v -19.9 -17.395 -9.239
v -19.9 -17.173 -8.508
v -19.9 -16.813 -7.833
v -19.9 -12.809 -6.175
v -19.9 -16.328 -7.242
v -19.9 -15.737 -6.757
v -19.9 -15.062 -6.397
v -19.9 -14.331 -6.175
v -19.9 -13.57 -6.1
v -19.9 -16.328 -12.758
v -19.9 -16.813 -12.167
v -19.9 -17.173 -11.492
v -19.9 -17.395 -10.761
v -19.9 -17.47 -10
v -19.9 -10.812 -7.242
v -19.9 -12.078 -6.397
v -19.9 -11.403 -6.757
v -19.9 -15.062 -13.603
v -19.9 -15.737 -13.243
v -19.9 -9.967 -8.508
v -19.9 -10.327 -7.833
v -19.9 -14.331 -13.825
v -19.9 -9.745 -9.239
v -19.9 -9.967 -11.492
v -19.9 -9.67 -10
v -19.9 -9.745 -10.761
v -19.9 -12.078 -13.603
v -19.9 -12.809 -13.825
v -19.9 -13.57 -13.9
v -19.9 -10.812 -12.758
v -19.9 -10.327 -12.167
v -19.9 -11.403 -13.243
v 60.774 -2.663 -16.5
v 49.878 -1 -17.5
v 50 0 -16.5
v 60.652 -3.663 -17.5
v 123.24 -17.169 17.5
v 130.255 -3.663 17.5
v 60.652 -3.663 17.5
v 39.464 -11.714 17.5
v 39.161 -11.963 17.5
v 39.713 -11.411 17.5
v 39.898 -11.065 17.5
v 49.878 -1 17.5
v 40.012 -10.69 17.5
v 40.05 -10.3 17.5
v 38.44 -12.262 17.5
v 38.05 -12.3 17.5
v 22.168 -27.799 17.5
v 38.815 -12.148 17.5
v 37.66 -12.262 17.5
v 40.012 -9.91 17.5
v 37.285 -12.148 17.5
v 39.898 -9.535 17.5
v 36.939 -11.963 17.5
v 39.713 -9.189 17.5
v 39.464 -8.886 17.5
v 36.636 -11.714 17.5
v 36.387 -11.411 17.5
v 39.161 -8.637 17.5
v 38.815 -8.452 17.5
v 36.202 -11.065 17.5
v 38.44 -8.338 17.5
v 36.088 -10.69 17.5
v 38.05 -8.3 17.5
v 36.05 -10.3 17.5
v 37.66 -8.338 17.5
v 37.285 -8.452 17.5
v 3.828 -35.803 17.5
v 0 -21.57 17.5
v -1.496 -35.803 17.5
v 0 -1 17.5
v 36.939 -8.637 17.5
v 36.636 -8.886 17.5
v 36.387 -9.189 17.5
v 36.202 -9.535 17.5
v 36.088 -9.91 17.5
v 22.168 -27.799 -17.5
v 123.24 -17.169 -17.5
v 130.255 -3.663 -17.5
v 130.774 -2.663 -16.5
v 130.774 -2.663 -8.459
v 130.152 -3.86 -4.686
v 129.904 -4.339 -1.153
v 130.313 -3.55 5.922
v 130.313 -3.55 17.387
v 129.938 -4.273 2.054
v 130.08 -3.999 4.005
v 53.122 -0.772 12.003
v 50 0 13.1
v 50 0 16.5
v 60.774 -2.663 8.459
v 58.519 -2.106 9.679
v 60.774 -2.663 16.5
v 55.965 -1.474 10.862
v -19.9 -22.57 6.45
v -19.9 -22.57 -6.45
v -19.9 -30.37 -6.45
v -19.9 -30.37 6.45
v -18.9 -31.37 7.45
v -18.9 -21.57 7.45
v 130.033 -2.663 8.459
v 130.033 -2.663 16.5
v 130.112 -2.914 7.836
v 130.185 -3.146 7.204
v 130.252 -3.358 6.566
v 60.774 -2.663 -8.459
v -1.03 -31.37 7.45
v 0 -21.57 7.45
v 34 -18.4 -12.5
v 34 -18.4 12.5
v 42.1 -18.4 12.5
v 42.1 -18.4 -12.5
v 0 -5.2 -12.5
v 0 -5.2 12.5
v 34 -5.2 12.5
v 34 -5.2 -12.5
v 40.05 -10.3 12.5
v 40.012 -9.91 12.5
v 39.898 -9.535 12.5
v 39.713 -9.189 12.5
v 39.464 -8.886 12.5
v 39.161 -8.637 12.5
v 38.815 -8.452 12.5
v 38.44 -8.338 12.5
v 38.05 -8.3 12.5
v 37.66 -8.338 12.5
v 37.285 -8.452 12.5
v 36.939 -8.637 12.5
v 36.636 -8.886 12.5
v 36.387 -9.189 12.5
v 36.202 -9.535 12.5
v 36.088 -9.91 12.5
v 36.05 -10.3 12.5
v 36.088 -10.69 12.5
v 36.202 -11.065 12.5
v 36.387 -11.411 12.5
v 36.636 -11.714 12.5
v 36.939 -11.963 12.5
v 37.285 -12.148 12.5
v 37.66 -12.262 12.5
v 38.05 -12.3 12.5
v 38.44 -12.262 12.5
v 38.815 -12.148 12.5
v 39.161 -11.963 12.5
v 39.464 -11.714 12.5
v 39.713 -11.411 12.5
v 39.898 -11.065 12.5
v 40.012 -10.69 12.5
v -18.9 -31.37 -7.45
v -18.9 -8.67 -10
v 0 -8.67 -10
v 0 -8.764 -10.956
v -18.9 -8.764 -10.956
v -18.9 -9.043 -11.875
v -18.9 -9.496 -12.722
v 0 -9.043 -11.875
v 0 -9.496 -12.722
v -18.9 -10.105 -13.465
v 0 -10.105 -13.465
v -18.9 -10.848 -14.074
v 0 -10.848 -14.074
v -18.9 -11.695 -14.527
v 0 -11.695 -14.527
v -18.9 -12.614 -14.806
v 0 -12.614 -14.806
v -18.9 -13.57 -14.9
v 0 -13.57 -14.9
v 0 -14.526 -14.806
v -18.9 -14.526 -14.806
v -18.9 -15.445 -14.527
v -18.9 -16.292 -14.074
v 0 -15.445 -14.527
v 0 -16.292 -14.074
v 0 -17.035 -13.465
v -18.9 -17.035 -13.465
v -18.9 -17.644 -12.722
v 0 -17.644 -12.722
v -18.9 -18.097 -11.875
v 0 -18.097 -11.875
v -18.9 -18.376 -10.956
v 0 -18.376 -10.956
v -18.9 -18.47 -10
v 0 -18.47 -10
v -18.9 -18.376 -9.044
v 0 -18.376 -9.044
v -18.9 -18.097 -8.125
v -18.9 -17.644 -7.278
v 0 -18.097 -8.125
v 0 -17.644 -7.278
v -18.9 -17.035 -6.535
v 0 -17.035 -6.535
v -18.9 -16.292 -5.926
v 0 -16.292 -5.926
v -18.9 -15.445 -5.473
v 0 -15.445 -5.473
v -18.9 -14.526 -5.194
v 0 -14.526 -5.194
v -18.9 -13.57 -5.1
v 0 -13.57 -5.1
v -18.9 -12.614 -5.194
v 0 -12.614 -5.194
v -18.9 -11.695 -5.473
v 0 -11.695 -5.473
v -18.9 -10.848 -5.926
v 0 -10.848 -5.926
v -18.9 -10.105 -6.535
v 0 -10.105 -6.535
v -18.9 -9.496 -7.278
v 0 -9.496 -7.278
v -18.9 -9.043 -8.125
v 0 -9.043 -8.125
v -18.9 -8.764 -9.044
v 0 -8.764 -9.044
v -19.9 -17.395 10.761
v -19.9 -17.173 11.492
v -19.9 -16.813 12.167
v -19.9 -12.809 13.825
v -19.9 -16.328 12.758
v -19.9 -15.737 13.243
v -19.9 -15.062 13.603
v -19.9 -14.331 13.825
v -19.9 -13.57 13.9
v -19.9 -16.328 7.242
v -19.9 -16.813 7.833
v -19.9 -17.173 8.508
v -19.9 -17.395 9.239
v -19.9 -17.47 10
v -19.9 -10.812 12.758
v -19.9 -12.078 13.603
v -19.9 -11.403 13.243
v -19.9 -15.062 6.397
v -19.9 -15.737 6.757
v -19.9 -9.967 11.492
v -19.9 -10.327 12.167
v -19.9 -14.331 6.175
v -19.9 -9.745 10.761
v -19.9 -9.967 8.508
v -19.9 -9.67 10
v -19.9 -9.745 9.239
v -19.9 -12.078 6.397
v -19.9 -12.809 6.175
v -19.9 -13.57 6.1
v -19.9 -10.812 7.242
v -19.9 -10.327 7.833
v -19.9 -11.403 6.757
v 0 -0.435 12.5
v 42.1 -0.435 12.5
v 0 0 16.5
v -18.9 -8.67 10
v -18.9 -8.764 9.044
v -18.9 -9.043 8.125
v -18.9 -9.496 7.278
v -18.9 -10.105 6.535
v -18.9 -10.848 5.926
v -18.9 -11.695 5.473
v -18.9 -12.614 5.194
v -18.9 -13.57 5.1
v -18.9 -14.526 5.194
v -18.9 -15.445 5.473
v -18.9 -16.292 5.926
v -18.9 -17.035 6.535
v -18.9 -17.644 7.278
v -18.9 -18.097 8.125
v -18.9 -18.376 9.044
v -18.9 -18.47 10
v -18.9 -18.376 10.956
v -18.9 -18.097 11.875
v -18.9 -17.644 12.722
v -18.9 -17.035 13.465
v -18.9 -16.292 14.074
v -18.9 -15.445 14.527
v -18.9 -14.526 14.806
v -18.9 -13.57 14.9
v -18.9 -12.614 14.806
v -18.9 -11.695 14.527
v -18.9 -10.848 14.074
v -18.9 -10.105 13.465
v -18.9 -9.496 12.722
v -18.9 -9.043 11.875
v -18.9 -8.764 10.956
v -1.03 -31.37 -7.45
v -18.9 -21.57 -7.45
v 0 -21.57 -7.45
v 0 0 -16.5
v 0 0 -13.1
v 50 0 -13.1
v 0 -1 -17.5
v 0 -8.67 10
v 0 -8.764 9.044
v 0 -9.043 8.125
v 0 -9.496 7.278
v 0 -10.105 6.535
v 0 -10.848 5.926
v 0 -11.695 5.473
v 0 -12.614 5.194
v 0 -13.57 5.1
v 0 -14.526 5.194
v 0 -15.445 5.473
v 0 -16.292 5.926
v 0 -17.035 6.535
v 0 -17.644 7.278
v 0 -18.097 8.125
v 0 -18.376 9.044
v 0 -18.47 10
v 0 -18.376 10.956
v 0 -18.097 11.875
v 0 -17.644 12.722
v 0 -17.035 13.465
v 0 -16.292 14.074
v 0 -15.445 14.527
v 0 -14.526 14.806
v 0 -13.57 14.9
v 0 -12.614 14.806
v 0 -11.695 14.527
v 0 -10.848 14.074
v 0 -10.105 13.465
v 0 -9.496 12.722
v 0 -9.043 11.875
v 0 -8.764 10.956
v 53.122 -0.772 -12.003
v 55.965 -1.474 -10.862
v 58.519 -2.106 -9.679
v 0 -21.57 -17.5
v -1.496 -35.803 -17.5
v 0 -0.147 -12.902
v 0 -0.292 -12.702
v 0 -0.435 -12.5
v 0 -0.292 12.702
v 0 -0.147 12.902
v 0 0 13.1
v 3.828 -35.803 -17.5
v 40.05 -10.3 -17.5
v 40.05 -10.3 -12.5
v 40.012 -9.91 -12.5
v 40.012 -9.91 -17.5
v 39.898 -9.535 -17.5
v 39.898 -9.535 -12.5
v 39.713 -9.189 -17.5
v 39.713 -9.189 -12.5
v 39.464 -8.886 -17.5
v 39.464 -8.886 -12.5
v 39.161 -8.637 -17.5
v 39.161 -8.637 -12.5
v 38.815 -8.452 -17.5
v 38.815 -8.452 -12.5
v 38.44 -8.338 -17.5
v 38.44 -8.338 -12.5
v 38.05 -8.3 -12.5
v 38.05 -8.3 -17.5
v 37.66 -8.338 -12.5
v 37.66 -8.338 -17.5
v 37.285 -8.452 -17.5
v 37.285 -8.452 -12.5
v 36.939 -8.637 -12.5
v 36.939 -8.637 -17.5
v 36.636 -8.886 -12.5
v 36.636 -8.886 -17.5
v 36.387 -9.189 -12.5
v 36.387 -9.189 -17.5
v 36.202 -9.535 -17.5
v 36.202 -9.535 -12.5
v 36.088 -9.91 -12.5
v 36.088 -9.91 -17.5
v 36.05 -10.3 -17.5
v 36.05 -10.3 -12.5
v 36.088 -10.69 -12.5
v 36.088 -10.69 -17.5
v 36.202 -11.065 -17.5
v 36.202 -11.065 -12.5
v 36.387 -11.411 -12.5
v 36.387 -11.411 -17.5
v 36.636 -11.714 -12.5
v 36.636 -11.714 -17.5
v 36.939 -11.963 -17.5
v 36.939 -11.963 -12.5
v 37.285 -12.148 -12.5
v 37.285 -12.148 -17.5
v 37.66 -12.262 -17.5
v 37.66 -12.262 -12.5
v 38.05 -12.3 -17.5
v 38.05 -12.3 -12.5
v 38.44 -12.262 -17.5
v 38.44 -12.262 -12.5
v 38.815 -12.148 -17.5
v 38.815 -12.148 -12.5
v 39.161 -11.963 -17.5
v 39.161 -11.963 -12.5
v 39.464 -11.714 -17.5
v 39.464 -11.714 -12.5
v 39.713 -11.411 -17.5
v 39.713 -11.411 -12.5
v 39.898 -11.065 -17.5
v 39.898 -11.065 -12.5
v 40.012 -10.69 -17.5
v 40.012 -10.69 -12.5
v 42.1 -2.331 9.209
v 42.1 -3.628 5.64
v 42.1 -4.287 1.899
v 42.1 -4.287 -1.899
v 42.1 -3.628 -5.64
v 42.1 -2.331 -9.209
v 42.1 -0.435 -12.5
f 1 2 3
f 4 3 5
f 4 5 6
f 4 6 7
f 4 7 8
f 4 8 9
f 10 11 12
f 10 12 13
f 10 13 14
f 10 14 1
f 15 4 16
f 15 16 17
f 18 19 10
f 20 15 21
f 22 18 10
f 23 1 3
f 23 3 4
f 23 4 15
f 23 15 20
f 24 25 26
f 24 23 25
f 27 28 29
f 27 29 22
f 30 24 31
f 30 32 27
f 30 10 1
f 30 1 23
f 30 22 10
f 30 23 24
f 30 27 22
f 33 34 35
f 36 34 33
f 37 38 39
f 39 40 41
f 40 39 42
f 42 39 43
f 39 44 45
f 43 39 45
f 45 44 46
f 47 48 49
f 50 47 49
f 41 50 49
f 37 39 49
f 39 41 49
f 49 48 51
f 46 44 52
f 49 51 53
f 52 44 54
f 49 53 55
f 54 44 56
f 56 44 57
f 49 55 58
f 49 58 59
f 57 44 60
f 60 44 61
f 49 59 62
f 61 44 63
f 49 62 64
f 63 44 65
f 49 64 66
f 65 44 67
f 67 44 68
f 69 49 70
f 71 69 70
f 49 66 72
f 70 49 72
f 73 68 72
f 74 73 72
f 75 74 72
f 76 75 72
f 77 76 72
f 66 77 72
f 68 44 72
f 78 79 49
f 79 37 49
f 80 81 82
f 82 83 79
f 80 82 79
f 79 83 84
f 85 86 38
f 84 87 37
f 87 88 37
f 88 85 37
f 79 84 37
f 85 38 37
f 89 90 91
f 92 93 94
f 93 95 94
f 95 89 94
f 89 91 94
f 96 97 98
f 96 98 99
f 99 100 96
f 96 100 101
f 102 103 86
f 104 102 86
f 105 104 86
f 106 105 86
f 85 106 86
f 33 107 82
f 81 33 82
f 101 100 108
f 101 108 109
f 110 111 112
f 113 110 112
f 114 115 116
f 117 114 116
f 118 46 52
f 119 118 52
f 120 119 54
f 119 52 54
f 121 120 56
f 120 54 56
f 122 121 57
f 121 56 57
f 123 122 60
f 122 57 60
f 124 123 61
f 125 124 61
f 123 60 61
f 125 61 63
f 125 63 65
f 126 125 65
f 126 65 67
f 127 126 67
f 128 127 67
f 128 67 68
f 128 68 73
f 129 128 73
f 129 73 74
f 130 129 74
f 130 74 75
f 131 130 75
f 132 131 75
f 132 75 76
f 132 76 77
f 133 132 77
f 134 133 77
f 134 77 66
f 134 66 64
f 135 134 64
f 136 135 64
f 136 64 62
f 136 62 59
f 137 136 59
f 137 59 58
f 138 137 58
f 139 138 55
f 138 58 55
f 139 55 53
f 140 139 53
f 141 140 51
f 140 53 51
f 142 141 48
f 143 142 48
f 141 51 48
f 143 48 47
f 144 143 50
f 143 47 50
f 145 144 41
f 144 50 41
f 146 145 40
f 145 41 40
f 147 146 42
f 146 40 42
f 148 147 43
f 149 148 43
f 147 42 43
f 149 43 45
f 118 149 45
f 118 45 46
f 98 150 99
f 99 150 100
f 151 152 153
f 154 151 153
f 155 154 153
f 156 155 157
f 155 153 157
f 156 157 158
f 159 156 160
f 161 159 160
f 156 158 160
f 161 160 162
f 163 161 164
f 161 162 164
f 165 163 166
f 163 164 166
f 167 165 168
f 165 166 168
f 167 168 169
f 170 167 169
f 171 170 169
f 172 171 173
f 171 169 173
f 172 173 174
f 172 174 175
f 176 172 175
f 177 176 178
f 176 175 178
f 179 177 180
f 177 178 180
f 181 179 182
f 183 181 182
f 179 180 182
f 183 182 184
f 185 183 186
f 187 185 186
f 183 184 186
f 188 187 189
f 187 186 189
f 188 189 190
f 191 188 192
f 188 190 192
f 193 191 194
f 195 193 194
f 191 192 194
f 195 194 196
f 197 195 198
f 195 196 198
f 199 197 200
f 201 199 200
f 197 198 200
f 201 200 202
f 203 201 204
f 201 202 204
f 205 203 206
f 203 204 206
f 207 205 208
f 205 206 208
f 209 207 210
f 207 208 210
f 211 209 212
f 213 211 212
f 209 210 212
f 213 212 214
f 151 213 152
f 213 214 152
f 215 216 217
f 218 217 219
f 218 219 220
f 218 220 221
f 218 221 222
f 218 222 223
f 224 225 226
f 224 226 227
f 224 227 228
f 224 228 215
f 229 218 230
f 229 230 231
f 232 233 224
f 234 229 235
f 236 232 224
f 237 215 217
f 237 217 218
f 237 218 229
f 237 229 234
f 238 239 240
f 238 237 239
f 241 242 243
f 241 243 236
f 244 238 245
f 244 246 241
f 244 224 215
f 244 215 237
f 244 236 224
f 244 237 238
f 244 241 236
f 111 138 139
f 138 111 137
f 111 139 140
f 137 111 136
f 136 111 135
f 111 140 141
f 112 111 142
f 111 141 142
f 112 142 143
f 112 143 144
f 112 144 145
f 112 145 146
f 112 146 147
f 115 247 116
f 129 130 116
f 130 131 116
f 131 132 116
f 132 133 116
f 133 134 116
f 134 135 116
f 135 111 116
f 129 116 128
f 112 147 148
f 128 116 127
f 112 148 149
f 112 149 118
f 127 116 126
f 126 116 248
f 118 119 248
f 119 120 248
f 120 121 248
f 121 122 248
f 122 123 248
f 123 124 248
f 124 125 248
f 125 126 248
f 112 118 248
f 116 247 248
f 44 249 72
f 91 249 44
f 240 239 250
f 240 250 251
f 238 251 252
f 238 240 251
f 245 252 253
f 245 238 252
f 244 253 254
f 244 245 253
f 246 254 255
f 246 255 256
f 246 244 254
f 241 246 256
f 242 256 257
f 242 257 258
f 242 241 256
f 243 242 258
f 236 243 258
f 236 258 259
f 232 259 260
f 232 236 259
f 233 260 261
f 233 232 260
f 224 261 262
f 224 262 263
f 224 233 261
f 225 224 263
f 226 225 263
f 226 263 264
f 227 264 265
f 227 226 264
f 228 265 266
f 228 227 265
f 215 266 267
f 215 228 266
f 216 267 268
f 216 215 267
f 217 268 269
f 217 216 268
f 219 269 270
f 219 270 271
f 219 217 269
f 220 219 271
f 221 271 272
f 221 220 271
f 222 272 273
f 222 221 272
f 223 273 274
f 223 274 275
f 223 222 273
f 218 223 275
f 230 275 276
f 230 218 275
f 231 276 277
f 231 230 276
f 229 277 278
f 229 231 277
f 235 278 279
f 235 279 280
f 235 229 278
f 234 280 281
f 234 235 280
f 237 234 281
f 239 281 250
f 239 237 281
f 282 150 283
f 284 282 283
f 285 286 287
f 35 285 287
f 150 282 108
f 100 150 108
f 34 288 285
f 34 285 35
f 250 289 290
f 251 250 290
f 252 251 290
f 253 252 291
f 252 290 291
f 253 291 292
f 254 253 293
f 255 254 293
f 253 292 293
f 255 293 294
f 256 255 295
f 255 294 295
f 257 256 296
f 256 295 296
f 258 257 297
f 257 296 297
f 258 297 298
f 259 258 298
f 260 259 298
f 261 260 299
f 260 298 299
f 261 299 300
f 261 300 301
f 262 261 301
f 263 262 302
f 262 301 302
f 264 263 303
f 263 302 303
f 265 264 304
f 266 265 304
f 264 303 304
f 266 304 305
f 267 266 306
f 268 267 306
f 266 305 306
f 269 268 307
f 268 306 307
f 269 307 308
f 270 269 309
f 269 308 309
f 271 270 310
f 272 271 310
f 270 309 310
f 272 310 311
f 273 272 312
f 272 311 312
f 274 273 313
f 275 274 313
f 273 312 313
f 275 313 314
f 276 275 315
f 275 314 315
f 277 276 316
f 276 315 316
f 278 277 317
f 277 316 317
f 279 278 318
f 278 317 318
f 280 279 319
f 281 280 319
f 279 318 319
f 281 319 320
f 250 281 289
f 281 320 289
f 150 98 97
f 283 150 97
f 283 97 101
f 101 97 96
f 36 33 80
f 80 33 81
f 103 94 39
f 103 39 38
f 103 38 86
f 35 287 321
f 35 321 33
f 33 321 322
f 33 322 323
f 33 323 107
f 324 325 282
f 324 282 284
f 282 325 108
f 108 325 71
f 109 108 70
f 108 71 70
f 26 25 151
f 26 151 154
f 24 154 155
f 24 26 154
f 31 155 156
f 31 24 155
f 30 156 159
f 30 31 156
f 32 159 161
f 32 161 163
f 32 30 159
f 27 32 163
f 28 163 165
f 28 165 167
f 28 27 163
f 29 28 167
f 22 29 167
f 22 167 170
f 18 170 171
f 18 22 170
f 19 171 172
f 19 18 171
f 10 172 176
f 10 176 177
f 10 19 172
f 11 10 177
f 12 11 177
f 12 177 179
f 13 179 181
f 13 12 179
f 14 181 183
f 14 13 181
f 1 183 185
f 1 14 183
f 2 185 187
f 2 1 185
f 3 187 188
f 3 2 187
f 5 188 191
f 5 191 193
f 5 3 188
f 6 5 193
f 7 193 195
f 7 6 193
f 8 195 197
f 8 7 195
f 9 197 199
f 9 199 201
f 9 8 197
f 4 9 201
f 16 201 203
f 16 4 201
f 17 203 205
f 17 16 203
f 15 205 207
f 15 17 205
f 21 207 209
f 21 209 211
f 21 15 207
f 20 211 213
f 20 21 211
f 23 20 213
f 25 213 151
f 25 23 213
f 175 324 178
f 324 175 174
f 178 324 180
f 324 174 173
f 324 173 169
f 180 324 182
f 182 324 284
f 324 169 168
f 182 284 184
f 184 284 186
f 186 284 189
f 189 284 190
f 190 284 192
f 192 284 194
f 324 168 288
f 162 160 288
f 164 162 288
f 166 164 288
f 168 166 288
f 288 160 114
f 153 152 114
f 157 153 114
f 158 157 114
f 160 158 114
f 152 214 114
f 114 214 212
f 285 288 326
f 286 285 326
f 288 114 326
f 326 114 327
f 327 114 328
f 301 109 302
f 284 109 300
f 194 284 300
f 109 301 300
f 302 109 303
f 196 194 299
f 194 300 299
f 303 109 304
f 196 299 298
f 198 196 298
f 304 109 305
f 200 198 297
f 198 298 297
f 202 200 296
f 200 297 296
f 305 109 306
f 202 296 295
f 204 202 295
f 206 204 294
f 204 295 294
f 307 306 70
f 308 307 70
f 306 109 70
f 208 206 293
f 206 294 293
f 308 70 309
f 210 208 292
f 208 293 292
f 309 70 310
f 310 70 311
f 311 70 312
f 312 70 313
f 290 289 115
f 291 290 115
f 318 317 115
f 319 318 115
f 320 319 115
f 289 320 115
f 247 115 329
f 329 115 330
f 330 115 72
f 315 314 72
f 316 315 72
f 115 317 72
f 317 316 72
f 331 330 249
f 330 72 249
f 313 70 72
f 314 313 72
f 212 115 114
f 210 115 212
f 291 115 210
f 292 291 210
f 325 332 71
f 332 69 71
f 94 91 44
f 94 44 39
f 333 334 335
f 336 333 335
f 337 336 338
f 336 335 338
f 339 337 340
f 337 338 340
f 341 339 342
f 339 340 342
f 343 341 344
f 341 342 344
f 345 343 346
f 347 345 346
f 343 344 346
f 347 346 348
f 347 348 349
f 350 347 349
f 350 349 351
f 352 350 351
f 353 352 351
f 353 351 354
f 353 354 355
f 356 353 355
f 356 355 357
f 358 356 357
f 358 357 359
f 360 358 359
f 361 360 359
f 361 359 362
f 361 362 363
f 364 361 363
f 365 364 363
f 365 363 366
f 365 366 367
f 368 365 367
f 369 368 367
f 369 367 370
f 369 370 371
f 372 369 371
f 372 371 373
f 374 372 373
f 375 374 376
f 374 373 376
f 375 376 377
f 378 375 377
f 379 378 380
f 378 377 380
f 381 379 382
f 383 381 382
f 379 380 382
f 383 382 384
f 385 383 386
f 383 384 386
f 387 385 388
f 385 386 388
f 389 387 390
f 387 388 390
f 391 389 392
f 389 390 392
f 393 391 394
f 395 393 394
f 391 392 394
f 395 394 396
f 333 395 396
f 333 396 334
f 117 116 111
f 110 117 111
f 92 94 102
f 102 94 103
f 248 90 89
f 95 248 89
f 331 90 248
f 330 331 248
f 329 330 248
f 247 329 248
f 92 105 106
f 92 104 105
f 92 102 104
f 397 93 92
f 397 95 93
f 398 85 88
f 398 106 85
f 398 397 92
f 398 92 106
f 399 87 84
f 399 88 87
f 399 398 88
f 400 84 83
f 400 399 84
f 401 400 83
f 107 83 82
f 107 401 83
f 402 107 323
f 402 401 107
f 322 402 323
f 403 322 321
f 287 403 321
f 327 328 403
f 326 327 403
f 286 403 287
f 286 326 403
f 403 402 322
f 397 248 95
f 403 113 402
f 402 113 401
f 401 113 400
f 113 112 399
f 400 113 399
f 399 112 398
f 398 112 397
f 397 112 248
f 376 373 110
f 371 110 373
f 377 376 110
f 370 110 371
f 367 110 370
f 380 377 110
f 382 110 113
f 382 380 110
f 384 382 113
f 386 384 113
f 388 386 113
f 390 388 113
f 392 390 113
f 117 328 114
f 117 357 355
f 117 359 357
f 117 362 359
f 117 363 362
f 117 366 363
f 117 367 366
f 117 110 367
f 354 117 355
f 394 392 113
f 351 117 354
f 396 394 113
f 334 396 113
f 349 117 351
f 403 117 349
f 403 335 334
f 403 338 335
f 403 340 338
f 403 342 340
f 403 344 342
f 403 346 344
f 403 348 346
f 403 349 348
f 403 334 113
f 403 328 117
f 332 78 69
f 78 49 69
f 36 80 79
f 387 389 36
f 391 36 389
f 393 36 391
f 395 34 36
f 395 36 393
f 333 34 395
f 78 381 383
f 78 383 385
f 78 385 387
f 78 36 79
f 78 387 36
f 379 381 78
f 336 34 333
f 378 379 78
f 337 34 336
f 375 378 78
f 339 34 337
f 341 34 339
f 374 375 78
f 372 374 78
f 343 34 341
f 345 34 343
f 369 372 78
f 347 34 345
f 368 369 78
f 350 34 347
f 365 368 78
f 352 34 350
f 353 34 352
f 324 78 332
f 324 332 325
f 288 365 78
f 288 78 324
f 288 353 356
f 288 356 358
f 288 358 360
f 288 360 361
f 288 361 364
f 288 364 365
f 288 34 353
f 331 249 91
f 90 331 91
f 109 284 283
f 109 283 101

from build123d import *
from OCP.BRepFilletAPI import BRepFilletAPI_MakeChamfer

# Parameters (mm, degrees)
EXTRUDE_1_DEPTH     = 17.5
CUT_EXTRUDE_1_DEPTH = 12.5
CUT_EXTRUDE_2_DEPTH = 135
CHAMFER_1_SIZE      = 1
CHAMFER_1_SIZE2     = 0.741639712
SKETCH_4_R          = 4.9
SKETCH_4_W          = 14.9
SKETCH_4_H          = 9.8
EXTRUDE_2_DEPTH     = 19.9
CHAMFER_2_SIZE      = 1
SKETCH_8_R          = 2
CUT_EXTRUDE_5_DEPTH = 141.031269382


with BuildPart() as part:
    # 스케치1 → 보스-돌출1 (new, symmetric)
    with BuildSketch(Plane.XY):
        Polygon((0, 0), (50, 0), (60.774208204, -2.663057759), (130.774208204, -2.663057759), (123.239760601, -17.169499956), (22.168183174, -27.799088209), (3.828389762, -35.803112621), (-1.495960418, -35.803112621), (0, -21.57), align=None)
    extrude(amount=EXTRUDE_1_DEPTH, both=True)

    # 스케치2 → 컷-돌출1 (cut, symmetric)
    with BuildSketch(Plane.XY):
        Polygon((0, 0), (0, -5.2), (34, -5.2), (34, -18.4), (42.1, -18.4), (42.1, 0), align=None)
    extrude(amount=CUT_EXTRUDE_1_DEPTH, both=True, mode=Mode.SUBTRACT)

    # 스케치3 → 컷-돌출2 (cut)
    with BuildSketch(Plane(origin=(0, 0, 0), x_dir=(0, 0, -1), z_dir=(1, 0, 0))):
        with BuildLine():
            Line((13.1, 0), (-13.1, 0))
            ThreePointArc((-13.1, 0), (0, -4.369440217), (13.1, 0))
        make_face()
    extrude(amount=CUT_EXTRUDE_2_DEPTH, mode=Mode.SUBTRACT)

    # 모따기1: one chamfer whose edges measure the first distance from different faces: ONE call of the kernel's chamfer builder (chamfer() names one face for all edges)
    chamfer_1_edges_1 = [part.edges().sort_by_distance(p)[0] for p in [
        (130.774208204, -2.663057759, 12.979729839),
    ]]
    chamfer_1_side_1 = [part.faces().sort_by_distance(p)[0] for p in [
        (126.871435624, -10.177257582, 0),
    ]]
    chamfer_1_edges_2 = [part.edges().sort_by_distance(p)[0] for p in [
        (95.774208204, -2.663057759, 17.5),
        (55.387104102, -1.331528879, 17.5),
        (25, 0, 17.5),
        (25, 0, -17.5),
        (55.387104102, -1.331528879, -17.5),
        (95.774208204, -2.663057759, -17.5),
    ]]
    chamfer_1 = BRepFilletAPI_MakeChamfer(part.part.solid().wrapped)
    for e in chamfer_1_edges_1:
        chamfer_1.Add(CHAMFER_1_SIZE, CHAMFER_1_SIZE2, e.wrapped, chamfer_1_side_1[0].wrapped)  # the first distance lies on this face
    for e in chamfer_1_edges_2:
        chamfer_1.Add(CHAMFER_1_SIZE, e.wrapped)
    add(Compound.cast(chamfer_1.Shape()), mode=Mode.REPLACE)

    # 스케치4 → 보스-돌출2 (add)
    with BuildSketch(Plane.ZY):
        with Locations(Location((10, -13.57, 0), (0, 0, 90))):
            Circle(SKETCH_4_R)
        with Locations(Location((-10, -13.57, 0), (0, 0, 90))):
            Circle(SKETCH_4_R)
        with Locations((0, -26.47)):
            Rectangle(SKETCH_4_W, SKETCH_4_H)
    extrude(amount=EXTRUDE_2_DEPTH)

    # 모따기2
    chamfer_2_edges = [part.edges().sort_by_distance(p)[0] for p in [
        (-19.9, -18.47, -10),
        (-19.9, -26.47, 7.45),
        (-19.9, -21.57, 0),
        (-19.9, -26.47, -7.45),
        (-19.9, -31.37, 0),
        (-19.9, -18.47, 10),
    ]]
    chamfer(chamfer_2_edges, length=CHAMFER_2_SIZE)

    # 스케치8 → 컷-돌출5 (cut, through all)
    with BuildSketch(Plane.XY.offset(17.5)):
        with Locations((38.05, -10.3)):
            Circle(SKETCH_8_R)
    extrude(amount=-CUT_EXTRUDE_5_DEPTH, mode=Mode.SUBTRACT)


solid = part.part
